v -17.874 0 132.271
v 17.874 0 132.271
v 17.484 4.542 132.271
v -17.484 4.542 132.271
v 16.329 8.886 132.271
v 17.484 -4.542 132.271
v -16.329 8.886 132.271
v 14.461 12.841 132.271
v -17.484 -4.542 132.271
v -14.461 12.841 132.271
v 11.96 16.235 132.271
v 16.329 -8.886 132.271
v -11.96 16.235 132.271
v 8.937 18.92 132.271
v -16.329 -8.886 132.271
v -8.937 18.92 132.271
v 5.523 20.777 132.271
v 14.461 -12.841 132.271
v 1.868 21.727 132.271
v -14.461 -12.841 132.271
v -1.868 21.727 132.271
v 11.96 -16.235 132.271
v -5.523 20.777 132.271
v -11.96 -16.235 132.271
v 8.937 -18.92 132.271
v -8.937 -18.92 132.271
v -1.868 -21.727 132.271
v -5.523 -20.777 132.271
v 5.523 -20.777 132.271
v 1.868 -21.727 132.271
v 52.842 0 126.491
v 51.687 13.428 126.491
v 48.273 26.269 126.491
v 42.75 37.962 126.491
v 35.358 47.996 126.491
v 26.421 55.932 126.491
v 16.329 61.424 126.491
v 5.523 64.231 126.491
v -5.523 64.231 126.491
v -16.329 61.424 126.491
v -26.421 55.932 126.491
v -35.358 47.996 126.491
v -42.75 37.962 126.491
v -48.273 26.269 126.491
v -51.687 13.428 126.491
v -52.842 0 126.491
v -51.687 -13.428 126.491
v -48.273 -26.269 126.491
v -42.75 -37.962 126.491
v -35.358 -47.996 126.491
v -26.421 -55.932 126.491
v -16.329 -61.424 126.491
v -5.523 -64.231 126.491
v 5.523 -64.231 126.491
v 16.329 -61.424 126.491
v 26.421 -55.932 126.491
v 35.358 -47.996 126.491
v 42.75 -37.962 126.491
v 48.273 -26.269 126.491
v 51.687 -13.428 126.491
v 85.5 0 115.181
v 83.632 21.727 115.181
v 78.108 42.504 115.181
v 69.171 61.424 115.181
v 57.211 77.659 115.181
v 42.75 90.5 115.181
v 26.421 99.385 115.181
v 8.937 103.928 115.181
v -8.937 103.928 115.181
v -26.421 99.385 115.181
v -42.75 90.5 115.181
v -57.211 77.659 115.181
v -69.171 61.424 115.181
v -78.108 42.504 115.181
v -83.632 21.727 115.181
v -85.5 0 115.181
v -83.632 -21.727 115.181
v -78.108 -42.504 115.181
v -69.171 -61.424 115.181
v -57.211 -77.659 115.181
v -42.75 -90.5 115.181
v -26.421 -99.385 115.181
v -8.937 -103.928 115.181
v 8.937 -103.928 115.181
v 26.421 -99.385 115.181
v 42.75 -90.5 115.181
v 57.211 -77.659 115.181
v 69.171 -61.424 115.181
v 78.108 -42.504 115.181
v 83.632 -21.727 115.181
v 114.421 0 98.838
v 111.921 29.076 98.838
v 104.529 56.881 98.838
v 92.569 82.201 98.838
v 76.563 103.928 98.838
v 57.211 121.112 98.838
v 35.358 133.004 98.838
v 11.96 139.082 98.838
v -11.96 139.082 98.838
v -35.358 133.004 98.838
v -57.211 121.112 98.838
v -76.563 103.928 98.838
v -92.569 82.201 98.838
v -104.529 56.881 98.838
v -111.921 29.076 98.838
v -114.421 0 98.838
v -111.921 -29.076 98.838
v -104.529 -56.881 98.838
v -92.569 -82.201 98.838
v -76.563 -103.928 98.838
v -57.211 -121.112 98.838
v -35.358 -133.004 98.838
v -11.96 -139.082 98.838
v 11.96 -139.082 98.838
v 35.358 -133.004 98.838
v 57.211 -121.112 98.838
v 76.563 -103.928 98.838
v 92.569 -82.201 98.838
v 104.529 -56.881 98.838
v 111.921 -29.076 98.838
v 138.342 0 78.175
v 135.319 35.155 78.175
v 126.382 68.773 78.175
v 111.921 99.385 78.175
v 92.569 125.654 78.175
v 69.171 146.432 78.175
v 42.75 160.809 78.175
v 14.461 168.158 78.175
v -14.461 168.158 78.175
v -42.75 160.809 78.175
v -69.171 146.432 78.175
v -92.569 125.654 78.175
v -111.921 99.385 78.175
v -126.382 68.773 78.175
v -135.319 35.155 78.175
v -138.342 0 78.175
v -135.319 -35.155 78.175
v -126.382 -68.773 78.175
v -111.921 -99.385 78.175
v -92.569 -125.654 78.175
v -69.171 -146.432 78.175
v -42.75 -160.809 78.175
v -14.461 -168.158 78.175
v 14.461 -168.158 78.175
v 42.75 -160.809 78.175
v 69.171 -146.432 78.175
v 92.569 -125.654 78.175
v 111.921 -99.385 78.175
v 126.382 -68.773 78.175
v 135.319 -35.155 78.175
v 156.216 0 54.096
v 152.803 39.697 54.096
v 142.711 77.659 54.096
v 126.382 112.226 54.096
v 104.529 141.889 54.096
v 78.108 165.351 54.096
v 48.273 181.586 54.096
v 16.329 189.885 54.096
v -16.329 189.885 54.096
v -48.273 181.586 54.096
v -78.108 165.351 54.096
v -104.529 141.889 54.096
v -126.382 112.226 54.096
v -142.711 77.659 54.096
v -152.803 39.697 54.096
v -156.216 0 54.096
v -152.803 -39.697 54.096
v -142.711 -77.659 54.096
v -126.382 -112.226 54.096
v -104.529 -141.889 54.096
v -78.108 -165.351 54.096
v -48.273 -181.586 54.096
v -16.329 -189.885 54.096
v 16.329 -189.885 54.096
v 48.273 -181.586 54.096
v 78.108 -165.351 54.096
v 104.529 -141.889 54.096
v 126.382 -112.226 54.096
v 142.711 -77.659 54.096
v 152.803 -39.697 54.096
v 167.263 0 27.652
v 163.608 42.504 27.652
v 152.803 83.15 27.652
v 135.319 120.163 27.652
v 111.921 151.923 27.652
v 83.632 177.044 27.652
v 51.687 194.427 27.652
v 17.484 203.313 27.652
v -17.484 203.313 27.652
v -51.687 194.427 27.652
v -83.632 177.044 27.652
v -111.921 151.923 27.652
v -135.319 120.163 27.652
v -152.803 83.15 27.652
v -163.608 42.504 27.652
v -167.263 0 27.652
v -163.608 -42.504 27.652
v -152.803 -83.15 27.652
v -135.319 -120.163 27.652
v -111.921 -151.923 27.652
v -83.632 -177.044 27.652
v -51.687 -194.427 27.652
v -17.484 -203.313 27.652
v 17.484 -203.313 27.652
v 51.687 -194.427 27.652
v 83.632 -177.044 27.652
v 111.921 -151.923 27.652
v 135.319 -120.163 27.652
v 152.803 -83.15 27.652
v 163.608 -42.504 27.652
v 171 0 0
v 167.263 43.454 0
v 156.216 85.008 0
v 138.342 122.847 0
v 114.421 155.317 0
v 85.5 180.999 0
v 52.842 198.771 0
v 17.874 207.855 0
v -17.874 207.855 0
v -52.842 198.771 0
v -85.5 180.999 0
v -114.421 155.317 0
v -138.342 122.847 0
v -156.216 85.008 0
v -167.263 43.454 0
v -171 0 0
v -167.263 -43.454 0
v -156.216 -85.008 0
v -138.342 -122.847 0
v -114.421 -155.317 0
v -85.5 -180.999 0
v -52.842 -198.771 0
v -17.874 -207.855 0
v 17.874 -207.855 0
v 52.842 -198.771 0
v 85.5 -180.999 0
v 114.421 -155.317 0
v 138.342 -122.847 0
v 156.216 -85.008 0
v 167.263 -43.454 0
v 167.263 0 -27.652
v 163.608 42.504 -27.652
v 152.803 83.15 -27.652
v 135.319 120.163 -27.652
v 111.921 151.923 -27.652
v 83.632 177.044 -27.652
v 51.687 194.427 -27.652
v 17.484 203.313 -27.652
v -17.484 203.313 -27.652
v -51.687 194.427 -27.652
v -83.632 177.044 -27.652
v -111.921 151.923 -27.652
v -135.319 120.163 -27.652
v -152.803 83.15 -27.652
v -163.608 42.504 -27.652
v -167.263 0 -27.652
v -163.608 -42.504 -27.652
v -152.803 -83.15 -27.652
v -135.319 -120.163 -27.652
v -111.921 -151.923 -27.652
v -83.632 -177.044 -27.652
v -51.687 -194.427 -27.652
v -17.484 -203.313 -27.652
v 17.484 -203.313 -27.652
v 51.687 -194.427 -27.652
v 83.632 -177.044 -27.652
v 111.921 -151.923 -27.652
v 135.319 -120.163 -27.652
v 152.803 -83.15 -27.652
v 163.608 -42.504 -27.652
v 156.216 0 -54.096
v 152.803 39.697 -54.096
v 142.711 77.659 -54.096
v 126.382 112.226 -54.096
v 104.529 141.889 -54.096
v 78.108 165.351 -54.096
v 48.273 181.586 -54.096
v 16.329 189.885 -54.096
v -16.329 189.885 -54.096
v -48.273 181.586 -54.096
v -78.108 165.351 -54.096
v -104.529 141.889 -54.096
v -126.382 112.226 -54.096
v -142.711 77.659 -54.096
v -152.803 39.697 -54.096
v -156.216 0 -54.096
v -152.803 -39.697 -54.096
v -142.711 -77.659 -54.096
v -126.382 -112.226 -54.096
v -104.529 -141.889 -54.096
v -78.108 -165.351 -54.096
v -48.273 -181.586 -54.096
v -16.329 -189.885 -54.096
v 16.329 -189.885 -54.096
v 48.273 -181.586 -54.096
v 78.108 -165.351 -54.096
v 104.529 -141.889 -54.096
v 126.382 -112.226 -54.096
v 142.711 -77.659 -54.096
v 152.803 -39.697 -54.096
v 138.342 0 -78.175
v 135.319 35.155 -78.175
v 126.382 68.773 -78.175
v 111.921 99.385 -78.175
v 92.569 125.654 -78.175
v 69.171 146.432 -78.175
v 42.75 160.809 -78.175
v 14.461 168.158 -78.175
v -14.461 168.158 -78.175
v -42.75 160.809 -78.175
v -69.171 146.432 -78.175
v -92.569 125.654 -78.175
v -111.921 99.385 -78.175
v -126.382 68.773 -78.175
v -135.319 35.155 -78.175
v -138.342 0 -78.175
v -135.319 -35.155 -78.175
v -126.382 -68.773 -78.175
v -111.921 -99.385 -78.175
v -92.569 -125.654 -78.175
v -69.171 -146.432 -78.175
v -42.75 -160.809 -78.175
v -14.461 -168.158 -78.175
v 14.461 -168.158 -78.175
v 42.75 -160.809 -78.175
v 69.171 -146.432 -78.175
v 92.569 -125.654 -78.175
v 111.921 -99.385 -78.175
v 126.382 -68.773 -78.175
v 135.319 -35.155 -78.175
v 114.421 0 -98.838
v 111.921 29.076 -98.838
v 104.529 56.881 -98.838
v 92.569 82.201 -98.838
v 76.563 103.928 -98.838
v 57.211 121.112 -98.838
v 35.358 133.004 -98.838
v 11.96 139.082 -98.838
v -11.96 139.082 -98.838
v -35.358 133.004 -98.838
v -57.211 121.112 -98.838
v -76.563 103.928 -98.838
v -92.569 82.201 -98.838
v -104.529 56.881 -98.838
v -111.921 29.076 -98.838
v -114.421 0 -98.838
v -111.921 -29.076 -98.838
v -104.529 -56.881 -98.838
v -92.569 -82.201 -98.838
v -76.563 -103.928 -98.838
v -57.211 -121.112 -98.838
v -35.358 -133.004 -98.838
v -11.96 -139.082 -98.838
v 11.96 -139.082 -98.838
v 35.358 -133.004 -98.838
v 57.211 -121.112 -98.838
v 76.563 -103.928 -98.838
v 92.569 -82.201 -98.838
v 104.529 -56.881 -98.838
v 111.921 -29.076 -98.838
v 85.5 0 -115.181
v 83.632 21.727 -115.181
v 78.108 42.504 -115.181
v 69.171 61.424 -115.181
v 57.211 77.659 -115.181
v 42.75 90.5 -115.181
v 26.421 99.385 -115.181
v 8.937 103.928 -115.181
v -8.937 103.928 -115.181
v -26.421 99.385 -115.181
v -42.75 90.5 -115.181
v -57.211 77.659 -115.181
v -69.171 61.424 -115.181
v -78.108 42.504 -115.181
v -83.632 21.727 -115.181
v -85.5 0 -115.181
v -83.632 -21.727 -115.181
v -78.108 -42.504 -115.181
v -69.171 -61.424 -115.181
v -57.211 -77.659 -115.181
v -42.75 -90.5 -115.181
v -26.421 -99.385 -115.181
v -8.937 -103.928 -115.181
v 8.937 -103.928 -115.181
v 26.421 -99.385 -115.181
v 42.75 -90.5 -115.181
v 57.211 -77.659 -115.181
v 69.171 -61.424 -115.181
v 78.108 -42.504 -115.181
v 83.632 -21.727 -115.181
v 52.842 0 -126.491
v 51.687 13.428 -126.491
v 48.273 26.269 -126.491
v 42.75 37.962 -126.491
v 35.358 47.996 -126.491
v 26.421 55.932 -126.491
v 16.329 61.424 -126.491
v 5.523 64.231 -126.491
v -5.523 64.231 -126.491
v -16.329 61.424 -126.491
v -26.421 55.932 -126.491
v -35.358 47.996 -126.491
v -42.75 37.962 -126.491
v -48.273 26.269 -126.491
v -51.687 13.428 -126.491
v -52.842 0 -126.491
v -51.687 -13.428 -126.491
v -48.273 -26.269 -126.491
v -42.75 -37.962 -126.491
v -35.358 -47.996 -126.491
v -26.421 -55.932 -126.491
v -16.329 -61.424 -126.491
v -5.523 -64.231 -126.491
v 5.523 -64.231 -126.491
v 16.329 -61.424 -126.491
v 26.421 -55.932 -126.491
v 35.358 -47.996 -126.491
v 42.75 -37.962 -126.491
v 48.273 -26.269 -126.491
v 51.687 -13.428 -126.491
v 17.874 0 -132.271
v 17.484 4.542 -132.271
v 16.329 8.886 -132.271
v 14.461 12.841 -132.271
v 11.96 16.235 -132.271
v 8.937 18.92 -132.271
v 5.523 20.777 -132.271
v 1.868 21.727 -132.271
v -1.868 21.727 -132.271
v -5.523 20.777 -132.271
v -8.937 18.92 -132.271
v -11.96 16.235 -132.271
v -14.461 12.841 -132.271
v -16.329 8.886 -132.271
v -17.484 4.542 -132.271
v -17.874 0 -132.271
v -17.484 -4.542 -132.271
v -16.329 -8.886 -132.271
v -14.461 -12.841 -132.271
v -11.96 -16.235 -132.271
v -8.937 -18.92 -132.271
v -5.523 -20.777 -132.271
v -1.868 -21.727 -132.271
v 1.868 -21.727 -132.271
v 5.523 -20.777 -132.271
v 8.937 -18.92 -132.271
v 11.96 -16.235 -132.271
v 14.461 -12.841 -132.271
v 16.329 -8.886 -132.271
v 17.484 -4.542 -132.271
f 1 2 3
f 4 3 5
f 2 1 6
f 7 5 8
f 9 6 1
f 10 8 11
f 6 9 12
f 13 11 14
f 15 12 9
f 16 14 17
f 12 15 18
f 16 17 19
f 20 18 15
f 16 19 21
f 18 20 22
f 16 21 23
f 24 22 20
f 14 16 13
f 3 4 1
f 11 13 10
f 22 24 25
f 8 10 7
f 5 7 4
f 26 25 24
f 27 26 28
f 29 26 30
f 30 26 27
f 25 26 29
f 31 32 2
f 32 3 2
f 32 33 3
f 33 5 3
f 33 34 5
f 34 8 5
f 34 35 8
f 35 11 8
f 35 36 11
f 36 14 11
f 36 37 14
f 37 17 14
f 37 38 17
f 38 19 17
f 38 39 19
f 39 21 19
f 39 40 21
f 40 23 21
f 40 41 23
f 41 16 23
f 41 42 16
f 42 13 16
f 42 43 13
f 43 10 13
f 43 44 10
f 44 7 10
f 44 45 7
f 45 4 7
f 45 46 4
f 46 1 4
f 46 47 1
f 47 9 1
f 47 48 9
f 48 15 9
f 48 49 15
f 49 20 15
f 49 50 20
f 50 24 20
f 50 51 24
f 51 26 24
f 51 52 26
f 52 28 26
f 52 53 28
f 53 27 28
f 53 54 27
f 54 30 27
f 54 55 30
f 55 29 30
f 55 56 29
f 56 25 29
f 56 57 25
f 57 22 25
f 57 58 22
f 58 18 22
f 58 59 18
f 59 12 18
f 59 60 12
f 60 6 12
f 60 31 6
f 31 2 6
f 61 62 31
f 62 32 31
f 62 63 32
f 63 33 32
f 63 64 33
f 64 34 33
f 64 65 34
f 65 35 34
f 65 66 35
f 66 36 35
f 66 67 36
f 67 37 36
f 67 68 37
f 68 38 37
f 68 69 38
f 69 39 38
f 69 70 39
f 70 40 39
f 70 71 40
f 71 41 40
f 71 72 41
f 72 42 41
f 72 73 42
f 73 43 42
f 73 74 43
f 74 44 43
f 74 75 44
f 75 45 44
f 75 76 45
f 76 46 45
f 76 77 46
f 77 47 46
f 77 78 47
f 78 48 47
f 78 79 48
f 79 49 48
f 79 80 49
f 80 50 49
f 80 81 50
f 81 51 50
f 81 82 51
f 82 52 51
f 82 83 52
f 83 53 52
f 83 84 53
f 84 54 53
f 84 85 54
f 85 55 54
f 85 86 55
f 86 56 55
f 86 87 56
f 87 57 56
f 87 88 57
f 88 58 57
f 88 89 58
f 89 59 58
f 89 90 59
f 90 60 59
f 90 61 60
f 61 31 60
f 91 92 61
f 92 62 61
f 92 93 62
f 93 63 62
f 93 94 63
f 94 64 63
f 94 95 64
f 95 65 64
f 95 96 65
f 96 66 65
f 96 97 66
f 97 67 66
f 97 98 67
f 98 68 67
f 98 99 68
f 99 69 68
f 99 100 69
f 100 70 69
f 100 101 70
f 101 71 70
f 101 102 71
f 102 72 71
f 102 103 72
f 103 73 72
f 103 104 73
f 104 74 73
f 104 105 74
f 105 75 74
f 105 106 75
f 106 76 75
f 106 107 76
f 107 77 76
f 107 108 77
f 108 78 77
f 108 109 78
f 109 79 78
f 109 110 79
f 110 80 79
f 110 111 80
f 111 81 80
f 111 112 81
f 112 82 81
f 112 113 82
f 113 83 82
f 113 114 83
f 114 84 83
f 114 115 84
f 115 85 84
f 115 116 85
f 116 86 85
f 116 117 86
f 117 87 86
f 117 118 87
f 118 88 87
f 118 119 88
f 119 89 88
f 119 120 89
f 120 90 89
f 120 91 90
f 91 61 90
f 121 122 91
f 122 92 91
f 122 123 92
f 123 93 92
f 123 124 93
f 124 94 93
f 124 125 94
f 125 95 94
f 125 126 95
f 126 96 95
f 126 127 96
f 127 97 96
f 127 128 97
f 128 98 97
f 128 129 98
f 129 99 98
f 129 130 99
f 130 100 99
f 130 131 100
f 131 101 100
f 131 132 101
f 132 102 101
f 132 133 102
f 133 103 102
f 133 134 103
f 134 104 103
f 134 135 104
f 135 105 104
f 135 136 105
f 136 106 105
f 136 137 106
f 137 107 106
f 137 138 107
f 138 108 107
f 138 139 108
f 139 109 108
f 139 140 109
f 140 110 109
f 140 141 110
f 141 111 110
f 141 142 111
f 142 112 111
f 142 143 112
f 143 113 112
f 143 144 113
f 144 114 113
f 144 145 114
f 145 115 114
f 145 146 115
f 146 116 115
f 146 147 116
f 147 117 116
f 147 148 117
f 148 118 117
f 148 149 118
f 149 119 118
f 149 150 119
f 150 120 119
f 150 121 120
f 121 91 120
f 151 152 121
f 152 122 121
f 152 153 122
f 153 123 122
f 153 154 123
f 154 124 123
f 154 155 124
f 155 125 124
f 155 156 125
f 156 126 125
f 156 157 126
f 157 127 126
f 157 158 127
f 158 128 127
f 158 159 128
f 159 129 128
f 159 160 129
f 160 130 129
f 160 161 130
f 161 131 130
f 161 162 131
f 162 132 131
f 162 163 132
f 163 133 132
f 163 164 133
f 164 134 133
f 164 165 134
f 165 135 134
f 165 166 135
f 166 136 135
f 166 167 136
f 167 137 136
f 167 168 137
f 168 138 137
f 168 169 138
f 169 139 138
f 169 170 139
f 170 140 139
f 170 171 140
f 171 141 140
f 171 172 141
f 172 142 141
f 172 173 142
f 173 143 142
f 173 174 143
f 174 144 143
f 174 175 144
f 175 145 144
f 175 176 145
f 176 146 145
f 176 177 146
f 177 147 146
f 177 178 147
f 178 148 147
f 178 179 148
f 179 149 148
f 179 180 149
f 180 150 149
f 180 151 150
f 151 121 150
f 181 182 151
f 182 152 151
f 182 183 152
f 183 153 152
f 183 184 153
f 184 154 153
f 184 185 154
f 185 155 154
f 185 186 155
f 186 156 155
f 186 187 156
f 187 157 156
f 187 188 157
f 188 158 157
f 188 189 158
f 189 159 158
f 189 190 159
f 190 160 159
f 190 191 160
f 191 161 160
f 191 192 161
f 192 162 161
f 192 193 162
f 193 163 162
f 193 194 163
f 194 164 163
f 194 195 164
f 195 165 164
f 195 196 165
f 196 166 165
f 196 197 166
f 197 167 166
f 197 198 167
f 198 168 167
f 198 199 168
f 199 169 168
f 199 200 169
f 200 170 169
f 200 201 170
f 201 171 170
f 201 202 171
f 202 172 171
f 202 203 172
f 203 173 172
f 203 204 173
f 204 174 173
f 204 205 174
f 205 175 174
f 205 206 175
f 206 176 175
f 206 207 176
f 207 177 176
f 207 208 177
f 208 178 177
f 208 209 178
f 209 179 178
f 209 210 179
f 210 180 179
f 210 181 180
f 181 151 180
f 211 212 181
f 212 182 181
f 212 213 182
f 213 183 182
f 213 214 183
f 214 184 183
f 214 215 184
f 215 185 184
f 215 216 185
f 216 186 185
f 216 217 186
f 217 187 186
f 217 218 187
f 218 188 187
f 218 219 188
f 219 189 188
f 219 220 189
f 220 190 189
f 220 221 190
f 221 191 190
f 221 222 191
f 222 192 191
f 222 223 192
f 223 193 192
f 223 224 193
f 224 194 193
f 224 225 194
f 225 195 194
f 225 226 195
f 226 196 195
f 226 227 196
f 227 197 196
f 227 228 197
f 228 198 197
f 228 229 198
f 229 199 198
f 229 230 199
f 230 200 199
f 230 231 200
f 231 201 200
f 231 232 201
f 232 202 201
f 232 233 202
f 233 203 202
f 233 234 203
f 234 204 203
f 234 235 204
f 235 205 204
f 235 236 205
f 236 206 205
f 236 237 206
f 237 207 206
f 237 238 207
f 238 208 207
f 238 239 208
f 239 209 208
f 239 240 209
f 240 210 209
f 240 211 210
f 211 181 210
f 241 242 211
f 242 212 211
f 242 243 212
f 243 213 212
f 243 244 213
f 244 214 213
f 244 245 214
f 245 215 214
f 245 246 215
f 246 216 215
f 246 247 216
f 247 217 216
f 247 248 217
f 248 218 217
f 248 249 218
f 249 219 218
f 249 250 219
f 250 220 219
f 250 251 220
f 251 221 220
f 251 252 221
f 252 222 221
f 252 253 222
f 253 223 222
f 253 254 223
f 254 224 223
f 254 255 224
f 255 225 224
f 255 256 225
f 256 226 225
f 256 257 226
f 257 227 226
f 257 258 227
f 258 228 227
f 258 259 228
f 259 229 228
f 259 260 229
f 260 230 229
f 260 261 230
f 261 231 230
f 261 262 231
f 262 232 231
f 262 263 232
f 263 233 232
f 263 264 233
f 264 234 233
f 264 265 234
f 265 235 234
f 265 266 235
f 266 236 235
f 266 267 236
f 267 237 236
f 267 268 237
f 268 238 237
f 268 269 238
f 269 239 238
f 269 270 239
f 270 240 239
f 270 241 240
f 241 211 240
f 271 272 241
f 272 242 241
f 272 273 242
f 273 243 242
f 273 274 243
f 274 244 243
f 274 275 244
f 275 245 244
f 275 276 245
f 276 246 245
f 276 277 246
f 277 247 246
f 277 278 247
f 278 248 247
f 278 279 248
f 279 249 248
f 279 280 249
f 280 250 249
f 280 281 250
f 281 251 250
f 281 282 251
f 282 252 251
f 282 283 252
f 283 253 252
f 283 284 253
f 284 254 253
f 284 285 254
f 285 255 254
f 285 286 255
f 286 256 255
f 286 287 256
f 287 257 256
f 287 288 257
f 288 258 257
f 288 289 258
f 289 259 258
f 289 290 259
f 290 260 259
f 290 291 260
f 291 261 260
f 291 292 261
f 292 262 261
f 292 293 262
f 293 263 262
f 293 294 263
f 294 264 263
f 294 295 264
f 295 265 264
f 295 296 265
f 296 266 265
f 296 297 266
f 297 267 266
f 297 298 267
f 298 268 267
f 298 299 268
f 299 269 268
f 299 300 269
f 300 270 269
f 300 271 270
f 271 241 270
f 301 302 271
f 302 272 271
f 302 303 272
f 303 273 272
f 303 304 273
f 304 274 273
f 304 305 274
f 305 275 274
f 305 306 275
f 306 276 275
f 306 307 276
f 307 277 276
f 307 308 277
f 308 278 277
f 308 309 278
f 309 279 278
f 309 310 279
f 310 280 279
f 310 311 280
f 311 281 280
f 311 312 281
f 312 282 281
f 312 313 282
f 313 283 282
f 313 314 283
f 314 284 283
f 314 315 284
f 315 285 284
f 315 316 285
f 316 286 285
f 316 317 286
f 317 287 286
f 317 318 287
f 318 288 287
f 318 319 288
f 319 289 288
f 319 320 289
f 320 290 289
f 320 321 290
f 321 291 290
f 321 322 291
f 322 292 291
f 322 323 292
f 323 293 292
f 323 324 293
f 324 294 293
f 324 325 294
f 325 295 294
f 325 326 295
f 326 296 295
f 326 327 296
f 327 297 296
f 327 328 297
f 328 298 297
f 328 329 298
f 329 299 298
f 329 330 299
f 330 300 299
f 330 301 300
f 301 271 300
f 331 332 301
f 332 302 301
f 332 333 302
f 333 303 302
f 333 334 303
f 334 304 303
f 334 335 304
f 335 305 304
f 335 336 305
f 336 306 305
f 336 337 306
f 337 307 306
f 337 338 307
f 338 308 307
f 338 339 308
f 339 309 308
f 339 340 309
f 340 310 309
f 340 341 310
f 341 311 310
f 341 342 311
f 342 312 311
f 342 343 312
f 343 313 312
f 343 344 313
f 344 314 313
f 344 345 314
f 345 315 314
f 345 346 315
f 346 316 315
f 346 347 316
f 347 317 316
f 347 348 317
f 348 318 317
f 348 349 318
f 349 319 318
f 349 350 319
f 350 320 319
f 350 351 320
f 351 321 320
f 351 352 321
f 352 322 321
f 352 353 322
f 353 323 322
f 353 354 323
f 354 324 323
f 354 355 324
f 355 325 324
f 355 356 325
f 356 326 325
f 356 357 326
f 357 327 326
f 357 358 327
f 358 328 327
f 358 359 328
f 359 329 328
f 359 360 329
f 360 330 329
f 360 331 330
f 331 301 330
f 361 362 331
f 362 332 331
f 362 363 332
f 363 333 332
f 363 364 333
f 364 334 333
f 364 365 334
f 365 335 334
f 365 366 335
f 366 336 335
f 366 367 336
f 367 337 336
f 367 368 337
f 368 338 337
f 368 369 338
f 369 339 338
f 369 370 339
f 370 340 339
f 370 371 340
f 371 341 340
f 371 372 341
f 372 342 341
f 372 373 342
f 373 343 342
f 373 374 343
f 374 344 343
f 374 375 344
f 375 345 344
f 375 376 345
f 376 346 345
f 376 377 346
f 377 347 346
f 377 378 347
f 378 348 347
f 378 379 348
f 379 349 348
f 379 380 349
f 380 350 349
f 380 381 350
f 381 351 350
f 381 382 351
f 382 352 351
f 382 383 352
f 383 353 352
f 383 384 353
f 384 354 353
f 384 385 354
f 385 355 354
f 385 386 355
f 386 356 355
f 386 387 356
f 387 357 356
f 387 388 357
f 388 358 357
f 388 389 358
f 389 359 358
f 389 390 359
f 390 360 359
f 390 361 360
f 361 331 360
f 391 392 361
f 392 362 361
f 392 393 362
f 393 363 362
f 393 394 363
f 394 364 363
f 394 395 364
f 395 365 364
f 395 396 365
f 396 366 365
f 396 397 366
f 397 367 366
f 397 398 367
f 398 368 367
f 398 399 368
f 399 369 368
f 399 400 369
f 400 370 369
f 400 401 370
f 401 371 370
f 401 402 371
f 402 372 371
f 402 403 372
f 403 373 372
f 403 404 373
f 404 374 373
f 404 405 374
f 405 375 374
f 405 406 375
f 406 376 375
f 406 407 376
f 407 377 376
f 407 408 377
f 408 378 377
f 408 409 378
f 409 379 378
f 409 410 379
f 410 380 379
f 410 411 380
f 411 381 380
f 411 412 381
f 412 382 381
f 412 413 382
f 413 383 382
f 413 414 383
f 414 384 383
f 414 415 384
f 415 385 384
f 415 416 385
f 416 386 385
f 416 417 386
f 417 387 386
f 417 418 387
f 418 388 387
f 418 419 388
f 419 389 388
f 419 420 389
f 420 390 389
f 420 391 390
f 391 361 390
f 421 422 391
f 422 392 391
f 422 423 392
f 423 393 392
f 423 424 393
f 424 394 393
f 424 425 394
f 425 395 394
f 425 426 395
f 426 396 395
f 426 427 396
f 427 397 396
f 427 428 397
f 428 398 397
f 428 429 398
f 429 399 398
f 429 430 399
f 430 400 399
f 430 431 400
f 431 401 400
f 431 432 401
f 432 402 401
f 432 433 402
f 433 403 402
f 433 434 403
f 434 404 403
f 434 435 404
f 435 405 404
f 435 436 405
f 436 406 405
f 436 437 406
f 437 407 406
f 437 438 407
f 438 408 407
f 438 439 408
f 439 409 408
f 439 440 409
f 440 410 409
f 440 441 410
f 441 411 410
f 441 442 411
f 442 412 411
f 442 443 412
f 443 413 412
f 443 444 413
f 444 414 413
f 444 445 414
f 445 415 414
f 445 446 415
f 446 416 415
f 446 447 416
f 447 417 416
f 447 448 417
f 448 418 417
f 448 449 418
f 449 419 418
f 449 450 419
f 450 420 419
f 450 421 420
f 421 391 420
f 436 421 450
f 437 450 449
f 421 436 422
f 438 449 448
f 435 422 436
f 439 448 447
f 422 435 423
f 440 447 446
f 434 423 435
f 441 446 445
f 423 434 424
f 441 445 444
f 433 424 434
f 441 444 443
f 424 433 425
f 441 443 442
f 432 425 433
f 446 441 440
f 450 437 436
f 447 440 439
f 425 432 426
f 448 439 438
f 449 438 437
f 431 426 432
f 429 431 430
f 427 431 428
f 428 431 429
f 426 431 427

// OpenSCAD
// Generated by SolidPython 1.0.1 on 2020-07-29 00:46:48


scale(v = [9, 11, 7]) {
	sphere(r = 19);
}
/***********************************************
*********      SolidPython code:      **********
************************************************
 
# import packages: SolidPython
from solid import *
from solid.utils import *
from itertools import chain, combinations, permutations


class Resize:

    def __init__(self, scad_file):
        self.scad_file = scad_file
        #self.scad_file = import_scad(scad_file)
        # cone/cylinder param:
        self.r1 = 0
        self.r2 = 0
        self.h = 0
        # rectangular prism param:
        self.w = 0
        self.l = 0
        # ellipse param:
        self.r = 0

    # import OpenScad code (file name corresponds to shape)


    # classify shape + parameters
    def assign(self, param1, param2, param3):
        if self.scad_file == 'cone.scad':
            self.r1 = param1
            self.r2 = param2
            self.h = param3
        elif self.scad_file == 'cylinder.scad':
            self.r1 = param1
            self.r2 = param2
            self.h = param3
        elif self.scad_file == 'rectangularPrism.scad':
            self.h = param1
            self.l = param2
            self.w = param3
        else:
            self.r = param1
            self.h = param2

    # resize parameters
    def iterate(self):
        x = range(3, 20, 2)
        i = 1
        if self.scad_file == 'cone.scad':
            tempList = list(permutations(x, 2))
            for temp in tempList:
                param1 = temp[0]
                param2 = temp[1]
                filepath = 'produced_scad_files/' + 'cone' + str(param1) + '_' + str(param2) + '_' + '.scad'
                scad_render_to_file(cylinder(h=param1, r1=param2, r2=0), filepath)

        elif self.scad_file == 'cylinder.scad':
            tempList = list(permutations(x, 3))
            for temp in tempList:
                param1 = temp[0]
                param2 = temp[1]
                filepath = 'produced_scad_files/' + 'cylinder' + str(param1) + '_' + str(param2) + '_' + '.scad'
                scad_render_to_file(cylinder(h=param1, r1=param2, r2=param2), filepath)

        elif self.scad_file == 'rectangularPrism.scad':
            tempList = list(permutations(x, 3))
            for temp in tempList:
                param1 = temp[0]
                param2 = temp[1]
                param3 = temp[2]
                filepath = 'produced_scad_files/' + 'rectangularPrism' + str(param1) + '_' + str(param2) + '_' + str(
                    param3) + '.scad'
                scad_render_to_file(cube(size=(param1, param2, param3)), filepath)

        elif self.scad_file == 'ellipse.scad':
            tempList = list(permutations(x, 4))
            for temp in tempList:
                param1 = temp[0]
                param2 = temp[1]
                param3 = temp[2]
                param4 = temp[3]
                filepath = 'produced_scad_files/' + 'ellipse' + str(param1) + '_' + str(param2) + '_' + str(param3) + '_' + str(param4) + '.scad'
                scad_render_to_file(scale([param1, param2, param3])(sphere(r=param4)), filepath)

    def render_to_scadfile(self):
        scad_render_to_file(scad, 'example.scad') 
 
************************************************/
